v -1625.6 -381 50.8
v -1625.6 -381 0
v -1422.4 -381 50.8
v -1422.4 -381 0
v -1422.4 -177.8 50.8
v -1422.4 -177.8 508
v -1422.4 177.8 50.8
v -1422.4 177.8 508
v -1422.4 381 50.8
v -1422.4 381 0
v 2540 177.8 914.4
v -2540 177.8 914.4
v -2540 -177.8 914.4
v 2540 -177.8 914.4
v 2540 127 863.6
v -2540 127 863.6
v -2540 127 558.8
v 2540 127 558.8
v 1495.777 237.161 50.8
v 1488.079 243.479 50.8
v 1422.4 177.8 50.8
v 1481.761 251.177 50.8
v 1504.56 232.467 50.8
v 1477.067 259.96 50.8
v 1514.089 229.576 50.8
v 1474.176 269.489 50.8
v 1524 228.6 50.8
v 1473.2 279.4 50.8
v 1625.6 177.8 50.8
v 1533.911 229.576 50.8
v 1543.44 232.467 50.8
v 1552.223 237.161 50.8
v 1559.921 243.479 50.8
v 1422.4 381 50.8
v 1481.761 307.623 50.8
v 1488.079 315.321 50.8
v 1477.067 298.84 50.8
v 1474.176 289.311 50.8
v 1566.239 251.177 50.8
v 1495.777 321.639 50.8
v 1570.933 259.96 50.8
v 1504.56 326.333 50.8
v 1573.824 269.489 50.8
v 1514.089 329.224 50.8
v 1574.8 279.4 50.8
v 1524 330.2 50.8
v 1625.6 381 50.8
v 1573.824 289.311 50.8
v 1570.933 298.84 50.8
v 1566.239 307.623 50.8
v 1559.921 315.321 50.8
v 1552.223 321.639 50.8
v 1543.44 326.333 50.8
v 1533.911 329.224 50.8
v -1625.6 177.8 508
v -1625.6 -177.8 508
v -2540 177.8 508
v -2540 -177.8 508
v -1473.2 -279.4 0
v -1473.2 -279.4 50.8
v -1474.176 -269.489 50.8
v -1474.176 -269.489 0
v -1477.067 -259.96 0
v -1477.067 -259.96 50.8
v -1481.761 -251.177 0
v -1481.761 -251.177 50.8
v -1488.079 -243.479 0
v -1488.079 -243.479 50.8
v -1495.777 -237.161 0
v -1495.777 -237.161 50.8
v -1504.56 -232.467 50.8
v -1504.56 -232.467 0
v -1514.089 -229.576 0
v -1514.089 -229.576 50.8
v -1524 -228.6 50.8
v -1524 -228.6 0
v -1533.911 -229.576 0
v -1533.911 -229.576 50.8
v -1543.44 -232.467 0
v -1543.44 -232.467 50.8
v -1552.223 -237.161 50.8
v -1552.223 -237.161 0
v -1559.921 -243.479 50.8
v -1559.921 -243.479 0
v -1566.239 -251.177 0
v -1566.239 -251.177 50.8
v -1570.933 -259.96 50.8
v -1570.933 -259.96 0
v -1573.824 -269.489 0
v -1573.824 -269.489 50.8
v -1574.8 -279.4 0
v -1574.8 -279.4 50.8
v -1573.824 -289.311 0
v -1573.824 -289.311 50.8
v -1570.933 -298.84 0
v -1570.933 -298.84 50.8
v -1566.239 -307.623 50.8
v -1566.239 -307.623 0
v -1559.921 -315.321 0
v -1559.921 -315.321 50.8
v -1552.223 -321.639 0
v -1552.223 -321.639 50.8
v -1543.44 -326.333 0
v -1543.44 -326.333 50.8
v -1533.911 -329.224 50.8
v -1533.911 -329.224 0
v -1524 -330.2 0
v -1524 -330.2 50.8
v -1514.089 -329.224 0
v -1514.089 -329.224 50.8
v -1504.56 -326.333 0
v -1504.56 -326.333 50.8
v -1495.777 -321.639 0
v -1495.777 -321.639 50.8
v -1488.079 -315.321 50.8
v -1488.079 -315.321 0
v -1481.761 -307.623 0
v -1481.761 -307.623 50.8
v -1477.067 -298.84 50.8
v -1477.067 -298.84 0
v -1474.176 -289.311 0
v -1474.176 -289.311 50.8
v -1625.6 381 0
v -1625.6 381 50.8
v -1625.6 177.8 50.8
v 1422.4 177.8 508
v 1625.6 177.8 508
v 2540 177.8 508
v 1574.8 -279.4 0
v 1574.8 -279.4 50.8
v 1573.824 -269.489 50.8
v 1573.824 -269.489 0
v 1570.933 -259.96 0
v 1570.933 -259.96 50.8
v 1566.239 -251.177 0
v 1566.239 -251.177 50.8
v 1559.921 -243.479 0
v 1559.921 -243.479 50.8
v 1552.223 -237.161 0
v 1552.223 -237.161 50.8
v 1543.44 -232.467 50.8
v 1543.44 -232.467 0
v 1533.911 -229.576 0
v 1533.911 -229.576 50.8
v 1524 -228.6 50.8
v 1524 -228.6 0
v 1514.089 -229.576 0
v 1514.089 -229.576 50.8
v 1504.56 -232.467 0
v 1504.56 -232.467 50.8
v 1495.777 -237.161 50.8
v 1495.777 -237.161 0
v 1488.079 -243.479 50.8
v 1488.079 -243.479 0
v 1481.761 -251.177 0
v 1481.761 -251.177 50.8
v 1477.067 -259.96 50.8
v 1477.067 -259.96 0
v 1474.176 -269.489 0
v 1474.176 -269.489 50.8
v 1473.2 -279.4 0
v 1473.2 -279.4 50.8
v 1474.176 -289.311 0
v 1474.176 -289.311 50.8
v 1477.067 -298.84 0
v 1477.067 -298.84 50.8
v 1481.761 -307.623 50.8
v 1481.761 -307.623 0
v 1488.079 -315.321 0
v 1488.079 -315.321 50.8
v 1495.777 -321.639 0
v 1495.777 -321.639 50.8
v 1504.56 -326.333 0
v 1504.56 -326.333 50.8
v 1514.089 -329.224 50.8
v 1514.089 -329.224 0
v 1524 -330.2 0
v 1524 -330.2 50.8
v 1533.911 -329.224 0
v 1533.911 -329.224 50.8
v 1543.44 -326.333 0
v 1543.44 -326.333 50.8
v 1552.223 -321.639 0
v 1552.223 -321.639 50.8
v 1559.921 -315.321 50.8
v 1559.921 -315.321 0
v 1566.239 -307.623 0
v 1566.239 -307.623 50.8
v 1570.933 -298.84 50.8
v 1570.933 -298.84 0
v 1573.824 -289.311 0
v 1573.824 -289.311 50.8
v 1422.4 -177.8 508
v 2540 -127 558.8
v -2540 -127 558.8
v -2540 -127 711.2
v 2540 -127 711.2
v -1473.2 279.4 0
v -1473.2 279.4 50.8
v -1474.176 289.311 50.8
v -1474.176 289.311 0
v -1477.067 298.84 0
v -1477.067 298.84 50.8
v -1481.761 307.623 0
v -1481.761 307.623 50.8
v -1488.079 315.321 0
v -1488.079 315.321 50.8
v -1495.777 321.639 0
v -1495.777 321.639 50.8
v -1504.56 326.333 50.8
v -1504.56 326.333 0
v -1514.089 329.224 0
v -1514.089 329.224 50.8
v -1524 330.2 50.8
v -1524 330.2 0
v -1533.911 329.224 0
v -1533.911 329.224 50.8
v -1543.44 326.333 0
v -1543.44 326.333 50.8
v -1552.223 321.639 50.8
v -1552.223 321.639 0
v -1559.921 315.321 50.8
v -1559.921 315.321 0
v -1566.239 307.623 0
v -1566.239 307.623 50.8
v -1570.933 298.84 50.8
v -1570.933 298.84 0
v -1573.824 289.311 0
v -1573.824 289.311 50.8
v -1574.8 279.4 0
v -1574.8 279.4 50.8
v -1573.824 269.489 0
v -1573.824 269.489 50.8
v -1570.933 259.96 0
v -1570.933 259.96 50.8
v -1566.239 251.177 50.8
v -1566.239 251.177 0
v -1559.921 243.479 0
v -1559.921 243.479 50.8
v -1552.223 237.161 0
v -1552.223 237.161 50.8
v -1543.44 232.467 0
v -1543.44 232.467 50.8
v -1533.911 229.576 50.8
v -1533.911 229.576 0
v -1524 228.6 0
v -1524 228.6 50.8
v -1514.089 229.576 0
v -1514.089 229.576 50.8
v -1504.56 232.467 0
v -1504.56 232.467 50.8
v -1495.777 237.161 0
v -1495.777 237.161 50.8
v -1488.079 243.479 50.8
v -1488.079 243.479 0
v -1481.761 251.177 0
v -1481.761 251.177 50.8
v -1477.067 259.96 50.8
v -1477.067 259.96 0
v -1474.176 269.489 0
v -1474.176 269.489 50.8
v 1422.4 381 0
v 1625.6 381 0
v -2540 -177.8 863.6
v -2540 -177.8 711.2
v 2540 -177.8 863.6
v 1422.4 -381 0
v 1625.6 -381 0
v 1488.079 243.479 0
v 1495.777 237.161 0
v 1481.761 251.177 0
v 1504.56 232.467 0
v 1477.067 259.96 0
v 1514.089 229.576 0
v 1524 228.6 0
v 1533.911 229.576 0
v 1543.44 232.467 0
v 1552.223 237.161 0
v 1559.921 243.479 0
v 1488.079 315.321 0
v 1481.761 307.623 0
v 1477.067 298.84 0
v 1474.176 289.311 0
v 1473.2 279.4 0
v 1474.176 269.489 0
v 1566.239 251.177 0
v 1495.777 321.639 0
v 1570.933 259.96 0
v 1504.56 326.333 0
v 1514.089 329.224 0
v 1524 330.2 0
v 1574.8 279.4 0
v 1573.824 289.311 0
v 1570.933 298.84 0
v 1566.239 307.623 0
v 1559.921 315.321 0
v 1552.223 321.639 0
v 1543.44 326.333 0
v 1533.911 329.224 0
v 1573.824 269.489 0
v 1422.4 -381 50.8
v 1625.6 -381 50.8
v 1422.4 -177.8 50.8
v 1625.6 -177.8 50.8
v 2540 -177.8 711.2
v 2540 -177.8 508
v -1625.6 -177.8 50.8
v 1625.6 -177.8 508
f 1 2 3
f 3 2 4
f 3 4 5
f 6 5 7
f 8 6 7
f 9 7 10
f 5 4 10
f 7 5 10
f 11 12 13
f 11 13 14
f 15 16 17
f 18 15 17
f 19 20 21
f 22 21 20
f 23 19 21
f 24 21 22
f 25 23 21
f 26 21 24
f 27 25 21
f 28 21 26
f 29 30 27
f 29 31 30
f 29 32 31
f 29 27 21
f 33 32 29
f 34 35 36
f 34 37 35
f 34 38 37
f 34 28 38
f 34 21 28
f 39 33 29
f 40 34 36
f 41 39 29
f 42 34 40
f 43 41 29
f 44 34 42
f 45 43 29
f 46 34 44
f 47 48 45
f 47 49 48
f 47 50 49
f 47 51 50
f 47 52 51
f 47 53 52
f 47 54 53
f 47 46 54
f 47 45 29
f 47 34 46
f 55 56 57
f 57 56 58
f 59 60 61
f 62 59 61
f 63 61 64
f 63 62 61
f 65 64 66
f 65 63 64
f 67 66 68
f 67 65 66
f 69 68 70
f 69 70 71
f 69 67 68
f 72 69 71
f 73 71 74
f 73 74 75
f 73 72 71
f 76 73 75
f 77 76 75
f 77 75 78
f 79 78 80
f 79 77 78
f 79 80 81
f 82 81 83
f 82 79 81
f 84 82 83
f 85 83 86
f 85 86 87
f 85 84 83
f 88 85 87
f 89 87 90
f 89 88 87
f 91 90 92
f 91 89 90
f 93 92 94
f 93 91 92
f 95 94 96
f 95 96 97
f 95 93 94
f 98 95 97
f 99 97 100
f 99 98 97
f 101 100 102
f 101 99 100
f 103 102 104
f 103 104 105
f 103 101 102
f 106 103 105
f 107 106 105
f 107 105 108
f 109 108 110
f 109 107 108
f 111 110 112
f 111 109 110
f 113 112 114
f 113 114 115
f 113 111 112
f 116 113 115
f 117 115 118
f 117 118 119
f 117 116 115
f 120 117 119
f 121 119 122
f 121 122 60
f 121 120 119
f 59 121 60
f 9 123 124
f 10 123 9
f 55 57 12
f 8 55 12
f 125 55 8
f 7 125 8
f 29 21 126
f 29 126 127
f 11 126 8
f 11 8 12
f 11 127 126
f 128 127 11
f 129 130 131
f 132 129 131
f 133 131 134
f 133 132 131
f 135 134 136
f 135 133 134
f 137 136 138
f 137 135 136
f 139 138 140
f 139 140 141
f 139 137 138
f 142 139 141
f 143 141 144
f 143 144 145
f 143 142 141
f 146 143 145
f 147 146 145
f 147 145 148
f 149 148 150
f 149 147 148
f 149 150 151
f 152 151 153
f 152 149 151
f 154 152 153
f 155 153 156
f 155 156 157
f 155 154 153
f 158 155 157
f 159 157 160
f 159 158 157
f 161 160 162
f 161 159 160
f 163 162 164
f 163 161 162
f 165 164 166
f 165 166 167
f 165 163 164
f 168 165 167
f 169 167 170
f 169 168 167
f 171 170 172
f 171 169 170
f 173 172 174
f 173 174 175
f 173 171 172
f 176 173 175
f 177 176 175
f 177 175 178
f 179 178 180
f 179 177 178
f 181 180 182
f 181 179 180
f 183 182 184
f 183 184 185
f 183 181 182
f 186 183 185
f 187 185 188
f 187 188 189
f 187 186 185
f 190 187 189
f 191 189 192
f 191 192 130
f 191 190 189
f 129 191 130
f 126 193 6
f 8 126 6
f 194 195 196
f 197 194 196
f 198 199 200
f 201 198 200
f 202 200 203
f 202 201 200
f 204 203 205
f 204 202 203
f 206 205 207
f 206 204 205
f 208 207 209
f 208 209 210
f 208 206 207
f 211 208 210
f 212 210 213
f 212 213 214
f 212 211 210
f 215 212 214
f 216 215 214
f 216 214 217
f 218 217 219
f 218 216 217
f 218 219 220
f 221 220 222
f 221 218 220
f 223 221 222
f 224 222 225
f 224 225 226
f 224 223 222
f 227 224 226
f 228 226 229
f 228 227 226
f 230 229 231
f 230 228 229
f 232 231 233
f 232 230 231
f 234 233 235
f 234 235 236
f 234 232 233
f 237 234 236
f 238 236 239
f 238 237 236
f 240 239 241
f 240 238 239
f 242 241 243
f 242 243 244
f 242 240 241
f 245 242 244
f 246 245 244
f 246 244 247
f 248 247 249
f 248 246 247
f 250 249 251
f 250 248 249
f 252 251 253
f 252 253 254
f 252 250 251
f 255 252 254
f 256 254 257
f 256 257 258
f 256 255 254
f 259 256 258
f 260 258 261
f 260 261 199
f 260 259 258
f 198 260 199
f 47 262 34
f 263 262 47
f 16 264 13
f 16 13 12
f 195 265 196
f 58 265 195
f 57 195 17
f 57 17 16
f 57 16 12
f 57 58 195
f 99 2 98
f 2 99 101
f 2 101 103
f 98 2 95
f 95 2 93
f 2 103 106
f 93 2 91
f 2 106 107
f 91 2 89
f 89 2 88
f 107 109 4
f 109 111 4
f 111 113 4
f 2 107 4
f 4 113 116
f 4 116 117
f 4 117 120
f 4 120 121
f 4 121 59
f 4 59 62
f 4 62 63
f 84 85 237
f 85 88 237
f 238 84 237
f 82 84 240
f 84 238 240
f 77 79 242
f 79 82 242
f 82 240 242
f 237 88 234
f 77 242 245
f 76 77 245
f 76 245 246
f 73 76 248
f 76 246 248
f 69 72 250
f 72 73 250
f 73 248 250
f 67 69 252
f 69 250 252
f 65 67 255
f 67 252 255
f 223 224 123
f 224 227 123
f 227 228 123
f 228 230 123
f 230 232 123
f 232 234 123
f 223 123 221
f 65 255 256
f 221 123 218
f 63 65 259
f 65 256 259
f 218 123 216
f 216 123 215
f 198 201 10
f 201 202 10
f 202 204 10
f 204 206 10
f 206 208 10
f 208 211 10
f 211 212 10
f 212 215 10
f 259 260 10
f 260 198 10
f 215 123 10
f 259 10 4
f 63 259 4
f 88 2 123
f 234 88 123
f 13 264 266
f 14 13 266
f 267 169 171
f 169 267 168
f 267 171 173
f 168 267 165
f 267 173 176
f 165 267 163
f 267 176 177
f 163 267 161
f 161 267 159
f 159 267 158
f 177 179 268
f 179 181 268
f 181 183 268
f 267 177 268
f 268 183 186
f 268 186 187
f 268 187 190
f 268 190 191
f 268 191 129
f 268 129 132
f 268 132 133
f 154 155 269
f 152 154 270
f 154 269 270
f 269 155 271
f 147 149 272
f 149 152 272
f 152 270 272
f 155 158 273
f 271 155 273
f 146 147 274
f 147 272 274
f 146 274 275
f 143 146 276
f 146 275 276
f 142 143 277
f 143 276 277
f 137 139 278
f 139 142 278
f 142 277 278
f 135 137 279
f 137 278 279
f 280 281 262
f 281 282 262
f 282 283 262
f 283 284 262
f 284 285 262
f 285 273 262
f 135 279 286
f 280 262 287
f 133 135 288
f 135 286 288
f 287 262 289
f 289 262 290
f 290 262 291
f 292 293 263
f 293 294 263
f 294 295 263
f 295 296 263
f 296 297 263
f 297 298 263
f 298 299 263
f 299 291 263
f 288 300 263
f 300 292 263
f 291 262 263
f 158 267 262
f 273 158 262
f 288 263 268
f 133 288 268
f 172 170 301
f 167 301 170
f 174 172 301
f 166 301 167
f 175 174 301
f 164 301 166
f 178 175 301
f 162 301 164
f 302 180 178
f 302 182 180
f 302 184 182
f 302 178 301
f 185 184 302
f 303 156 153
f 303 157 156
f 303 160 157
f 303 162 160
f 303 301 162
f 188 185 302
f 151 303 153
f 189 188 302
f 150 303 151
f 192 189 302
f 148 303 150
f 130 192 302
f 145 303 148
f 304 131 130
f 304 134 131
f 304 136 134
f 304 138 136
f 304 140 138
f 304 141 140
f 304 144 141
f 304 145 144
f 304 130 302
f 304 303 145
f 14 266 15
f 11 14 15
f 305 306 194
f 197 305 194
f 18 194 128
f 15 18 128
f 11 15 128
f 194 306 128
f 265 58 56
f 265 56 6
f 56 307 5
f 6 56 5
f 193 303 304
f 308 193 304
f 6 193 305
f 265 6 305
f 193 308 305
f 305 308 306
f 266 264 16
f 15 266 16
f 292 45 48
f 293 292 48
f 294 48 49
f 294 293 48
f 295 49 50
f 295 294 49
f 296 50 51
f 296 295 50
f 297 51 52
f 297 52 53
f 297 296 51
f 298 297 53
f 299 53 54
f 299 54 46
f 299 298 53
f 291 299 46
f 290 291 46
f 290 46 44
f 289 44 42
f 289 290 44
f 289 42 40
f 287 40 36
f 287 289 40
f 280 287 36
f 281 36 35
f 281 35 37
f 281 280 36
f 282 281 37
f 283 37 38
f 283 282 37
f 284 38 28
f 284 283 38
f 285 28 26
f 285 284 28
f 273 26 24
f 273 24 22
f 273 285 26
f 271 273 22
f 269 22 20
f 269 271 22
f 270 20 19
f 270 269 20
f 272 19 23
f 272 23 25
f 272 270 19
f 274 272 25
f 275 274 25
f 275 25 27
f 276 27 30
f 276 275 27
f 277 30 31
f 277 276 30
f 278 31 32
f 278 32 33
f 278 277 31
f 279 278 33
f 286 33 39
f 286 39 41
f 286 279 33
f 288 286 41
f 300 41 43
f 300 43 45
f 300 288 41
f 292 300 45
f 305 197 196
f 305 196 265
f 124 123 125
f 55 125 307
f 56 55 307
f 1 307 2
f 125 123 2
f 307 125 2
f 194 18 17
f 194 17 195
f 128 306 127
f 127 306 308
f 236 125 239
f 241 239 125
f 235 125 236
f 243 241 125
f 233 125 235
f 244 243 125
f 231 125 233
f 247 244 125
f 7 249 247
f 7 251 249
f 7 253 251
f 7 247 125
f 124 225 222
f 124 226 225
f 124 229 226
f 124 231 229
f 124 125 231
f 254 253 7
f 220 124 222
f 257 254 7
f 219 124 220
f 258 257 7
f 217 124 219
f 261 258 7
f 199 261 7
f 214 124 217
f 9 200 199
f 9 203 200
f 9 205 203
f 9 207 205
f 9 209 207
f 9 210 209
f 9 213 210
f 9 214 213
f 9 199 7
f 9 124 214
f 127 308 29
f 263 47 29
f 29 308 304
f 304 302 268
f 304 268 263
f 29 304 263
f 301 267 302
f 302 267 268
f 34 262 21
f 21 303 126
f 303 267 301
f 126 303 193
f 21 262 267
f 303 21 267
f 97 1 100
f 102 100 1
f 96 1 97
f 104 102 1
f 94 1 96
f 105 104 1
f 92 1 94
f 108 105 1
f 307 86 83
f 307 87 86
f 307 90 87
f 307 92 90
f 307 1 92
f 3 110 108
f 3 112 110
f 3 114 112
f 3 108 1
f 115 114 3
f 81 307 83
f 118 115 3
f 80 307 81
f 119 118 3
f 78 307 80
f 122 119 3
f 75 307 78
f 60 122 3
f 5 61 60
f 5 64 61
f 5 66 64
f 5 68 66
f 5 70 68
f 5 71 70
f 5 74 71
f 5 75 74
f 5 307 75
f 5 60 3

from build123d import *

# Parameters (mm, degrees)
F0_W     = 203.2
F0_H     = 203.2
F0_R     = 50.8
F0_H_2   = 355.6
F0_W_2   = 2844.8
F0_W_3   = 914.4
F1_DEPTH = 50.8
F2_DEPTH = 914.4
F3_W     = 50.8
F3_H     = 152.4
F4_DEPTH = 5963.92
F6_DEPTH = 1143


with BuildPart() as f1:
    # F0 (on Top) → F1 (new body)
    with BuildSketch(Plane.XY):
        with Locations((-1524, 279.4)):
            Rectangle(F0_W, F0_H)
        with Locations((-1524, 279.4)):
            Circle(F0_R, mode=Mode.SUBTRACT)
        with Locations((-1524, -279.4)):
            Rectangle(F0_W, F0_H)
        with Locations((-1524, -279.4)):
            Circle(F0_R, mode=Mode.SUBTRACT)
        with Locations((-1524, 0)):
            Rectangle(F0_W, F0_H_2)
        Rectangle(F0_W_2, F0_H_2)
        with Locations((-2082.8, 0)):
            Rectangle(F0_W_3, F0_H_2)
        with Locations((2082.8, 0)):
            Rectangle(F0_W_3, F0_H_2)
        with Locations((1524, 0)):
            Rectangle(F0_W, F0_H_2)
        with Locations((1524, 279.4)):
            Rectangle(F0_W, F0_H)
        with Locations((1524, 279.4)):
            Circle(F0_R, mode=Mode.SUBTRACT)
        with Locations((1524, -279.4)):
            Rectangle(F0_W, F0_H)
        with Locations((1524, -279.4)):
            Circle(F0_R, mode=Mode.SUBTRACT)
    extrude(amount=F1_DEPTH)

    # F0 (on Top) → F2 (join)
    with BuildSketch(Plane.XY):
        Rectangle(F0_W_2, F0_H_2)
        with Locations((2082.8, 0)):
            Rectangle(F0_W_3, F0_H_2)
        with Locations((-2082.8, 0)):
            Rectangle(F0_W_3, F0_H_2)
        with Locations((-1524, 0)):
            Rectangle(F0_W, F0_H_2)
        with Locations((1524, 0)):
            Rectangle(F0_W, F0_H_2)
    extrude(amount=F2_DEPTH)

    # F3 (on face) → F4 (cut)
    with BuildSketch(Plane(origin=(-2540, 0, 0), x_dir=(0, -1, 0), z_dir=(-1, 0, 0))):
        Polygon((-127, 863.6), (-127, 558.8), (127, 558.8), (127, 711.2), (127, 863.6), align=None)
        with Locations((203.2, 787.4)):
            Rectangle(F3_W, F3_H)
        with Locations((152.4, 787.4)):
            Rectangle(F3_W, F3_H)
    extrude(amount=-F4_DEPTH, mode=Mode.SUBTRACT)

    # F5 (on face) → F6 (cut)
    with BuildSketch(Plane.XZ.offset(177.8)):
        Polygon((-1422.4, 508), (-1422.4, 50.8), (-1422.4, 0), (1422.4, 0), (1422.4, 50.8), (1422.4, 508), align=None)
        Polygon((2540, 0), (2540, 508), (1625.6, 508), (1625.6, 50.8), (1625.6, 0), align=None)
        Polygon((-2540, 0), (-1625.6, 0), (-1625.6, 50.8), (-1625.6, 508), (-2540, 508), align=None)
    extrude(amount=-F6_DEPTH, mode=Mode.SUBTRACT)


solid = f1.part
